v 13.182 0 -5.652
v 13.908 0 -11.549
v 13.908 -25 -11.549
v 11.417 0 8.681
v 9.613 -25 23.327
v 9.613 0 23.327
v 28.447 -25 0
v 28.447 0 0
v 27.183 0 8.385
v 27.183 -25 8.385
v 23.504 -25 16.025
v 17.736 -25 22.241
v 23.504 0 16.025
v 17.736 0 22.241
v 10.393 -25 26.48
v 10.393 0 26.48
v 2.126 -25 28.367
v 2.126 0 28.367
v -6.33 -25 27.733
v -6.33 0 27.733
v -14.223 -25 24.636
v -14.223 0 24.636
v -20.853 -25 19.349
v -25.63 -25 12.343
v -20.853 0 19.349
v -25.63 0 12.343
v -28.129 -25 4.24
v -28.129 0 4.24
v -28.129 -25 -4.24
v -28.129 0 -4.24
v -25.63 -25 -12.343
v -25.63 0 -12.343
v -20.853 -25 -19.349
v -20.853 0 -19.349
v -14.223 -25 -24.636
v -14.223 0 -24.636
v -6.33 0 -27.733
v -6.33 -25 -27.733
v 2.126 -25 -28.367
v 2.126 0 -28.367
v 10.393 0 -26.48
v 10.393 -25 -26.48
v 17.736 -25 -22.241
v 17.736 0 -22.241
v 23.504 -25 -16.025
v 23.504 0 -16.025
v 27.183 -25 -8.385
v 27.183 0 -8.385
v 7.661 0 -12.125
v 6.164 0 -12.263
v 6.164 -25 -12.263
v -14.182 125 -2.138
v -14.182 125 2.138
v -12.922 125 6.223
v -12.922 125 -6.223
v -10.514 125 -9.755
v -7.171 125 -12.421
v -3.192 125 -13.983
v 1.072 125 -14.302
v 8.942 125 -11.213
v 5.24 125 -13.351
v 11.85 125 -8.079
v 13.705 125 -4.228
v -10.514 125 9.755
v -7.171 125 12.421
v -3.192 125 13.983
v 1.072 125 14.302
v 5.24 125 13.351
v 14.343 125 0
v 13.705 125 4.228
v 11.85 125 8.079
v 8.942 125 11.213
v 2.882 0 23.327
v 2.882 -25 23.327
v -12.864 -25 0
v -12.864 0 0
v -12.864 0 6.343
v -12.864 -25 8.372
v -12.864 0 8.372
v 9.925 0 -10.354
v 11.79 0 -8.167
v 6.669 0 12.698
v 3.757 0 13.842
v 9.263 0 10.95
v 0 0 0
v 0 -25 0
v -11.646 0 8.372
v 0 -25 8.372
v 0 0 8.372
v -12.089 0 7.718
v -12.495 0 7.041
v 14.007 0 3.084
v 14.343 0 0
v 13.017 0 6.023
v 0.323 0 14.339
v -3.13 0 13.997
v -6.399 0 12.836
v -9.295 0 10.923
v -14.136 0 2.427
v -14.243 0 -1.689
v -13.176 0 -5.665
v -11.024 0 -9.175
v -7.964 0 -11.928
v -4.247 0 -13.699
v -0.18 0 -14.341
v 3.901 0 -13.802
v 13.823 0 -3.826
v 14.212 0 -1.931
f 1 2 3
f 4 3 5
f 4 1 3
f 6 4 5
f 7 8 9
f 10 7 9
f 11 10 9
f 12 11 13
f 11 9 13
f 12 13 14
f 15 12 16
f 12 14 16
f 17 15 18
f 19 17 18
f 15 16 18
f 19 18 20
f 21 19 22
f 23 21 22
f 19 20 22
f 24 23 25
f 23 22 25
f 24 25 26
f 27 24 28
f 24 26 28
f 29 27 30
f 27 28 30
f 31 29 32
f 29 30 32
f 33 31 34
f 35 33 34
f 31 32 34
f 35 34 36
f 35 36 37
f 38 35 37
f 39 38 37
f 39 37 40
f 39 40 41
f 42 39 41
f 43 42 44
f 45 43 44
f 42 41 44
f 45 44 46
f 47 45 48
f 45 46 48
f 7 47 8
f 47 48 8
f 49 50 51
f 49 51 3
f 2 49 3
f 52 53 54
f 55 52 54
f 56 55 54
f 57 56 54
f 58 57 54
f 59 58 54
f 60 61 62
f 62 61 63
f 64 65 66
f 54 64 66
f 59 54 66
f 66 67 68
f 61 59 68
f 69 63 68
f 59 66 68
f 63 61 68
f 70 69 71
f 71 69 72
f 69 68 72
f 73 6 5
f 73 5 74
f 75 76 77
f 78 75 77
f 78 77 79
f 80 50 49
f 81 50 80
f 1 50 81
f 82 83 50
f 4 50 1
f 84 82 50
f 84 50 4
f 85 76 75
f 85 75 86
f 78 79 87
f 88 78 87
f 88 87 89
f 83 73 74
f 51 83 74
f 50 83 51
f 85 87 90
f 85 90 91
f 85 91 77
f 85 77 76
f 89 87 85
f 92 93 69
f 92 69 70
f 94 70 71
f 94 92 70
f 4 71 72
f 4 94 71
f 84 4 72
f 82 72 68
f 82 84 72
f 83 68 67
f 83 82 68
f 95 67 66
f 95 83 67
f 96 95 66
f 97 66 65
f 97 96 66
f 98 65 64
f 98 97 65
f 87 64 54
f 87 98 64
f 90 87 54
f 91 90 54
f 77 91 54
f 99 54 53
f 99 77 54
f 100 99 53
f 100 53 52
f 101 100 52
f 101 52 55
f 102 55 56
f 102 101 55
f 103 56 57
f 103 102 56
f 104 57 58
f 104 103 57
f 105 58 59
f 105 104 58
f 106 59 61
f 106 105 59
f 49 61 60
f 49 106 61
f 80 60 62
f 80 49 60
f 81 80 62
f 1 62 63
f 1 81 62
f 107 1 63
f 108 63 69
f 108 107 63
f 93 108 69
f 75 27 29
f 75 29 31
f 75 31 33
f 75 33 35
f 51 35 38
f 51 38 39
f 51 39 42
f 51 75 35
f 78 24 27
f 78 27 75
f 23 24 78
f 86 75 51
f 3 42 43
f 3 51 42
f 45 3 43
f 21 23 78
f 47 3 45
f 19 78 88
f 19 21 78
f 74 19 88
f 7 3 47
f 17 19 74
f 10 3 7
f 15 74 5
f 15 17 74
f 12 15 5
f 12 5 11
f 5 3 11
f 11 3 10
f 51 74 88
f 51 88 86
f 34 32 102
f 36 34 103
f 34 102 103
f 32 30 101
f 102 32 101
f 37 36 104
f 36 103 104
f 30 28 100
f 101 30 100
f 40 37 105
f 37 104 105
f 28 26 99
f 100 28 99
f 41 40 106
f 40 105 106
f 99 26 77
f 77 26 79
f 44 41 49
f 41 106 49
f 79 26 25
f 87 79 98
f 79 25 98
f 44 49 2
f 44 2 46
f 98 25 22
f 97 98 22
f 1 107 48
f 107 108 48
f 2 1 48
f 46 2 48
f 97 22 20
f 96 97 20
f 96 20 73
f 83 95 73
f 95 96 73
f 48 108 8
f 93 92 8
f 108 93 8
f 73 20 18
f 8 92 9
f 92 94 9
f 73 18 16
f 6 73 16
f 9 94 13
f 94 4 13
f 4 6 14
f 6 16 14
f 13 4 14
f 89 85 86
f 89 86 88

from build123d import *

# Parameters (mm, degrees)
F0_R     = 28.446673
F1_DEPTH = 25
F2_W     = 12.863994
F2_H     = 8.371785
F3_DEPTH = 25
F5_DEPTH = 25
F6_R     = 14.342599
F7_DEPTH = 125


with BuildPart() as f1:
    # F0 (on Front) → F1 (new body)
    with BuildSketch(Plane.XZ):
        Circle(F0_R)
    extrude(amount=F1_DEPTH)

    # F2 (on Front) → F3 (cut)
    with BuildSketch(Plane.XZ):
        with Locations((-6.431997, 4.185892)):
            Rectangle(F2_W, F2_H)
    extrude(amount=F3_DEPTH, mode=Mode.SUBTRACT)

    # F4 (on Front) → F5 (cut)
    with BuildSketch(Plane.XZ):
        Polygon((13.908368, -11.549142), (9.61332, 23.327414), (2.882242, 23.327414), (6.163642, -12.263194), align=None)
    extrude(amount=F5_DEPTH, mode=Mode.SUBTRACT)

    # F6 (on Front) → F7 (join)
    with BuildSketch(Plane.XZ):
        Circle(F6_R)
    extrude(amount=-F7_DEPTH)


solid = f1.part
